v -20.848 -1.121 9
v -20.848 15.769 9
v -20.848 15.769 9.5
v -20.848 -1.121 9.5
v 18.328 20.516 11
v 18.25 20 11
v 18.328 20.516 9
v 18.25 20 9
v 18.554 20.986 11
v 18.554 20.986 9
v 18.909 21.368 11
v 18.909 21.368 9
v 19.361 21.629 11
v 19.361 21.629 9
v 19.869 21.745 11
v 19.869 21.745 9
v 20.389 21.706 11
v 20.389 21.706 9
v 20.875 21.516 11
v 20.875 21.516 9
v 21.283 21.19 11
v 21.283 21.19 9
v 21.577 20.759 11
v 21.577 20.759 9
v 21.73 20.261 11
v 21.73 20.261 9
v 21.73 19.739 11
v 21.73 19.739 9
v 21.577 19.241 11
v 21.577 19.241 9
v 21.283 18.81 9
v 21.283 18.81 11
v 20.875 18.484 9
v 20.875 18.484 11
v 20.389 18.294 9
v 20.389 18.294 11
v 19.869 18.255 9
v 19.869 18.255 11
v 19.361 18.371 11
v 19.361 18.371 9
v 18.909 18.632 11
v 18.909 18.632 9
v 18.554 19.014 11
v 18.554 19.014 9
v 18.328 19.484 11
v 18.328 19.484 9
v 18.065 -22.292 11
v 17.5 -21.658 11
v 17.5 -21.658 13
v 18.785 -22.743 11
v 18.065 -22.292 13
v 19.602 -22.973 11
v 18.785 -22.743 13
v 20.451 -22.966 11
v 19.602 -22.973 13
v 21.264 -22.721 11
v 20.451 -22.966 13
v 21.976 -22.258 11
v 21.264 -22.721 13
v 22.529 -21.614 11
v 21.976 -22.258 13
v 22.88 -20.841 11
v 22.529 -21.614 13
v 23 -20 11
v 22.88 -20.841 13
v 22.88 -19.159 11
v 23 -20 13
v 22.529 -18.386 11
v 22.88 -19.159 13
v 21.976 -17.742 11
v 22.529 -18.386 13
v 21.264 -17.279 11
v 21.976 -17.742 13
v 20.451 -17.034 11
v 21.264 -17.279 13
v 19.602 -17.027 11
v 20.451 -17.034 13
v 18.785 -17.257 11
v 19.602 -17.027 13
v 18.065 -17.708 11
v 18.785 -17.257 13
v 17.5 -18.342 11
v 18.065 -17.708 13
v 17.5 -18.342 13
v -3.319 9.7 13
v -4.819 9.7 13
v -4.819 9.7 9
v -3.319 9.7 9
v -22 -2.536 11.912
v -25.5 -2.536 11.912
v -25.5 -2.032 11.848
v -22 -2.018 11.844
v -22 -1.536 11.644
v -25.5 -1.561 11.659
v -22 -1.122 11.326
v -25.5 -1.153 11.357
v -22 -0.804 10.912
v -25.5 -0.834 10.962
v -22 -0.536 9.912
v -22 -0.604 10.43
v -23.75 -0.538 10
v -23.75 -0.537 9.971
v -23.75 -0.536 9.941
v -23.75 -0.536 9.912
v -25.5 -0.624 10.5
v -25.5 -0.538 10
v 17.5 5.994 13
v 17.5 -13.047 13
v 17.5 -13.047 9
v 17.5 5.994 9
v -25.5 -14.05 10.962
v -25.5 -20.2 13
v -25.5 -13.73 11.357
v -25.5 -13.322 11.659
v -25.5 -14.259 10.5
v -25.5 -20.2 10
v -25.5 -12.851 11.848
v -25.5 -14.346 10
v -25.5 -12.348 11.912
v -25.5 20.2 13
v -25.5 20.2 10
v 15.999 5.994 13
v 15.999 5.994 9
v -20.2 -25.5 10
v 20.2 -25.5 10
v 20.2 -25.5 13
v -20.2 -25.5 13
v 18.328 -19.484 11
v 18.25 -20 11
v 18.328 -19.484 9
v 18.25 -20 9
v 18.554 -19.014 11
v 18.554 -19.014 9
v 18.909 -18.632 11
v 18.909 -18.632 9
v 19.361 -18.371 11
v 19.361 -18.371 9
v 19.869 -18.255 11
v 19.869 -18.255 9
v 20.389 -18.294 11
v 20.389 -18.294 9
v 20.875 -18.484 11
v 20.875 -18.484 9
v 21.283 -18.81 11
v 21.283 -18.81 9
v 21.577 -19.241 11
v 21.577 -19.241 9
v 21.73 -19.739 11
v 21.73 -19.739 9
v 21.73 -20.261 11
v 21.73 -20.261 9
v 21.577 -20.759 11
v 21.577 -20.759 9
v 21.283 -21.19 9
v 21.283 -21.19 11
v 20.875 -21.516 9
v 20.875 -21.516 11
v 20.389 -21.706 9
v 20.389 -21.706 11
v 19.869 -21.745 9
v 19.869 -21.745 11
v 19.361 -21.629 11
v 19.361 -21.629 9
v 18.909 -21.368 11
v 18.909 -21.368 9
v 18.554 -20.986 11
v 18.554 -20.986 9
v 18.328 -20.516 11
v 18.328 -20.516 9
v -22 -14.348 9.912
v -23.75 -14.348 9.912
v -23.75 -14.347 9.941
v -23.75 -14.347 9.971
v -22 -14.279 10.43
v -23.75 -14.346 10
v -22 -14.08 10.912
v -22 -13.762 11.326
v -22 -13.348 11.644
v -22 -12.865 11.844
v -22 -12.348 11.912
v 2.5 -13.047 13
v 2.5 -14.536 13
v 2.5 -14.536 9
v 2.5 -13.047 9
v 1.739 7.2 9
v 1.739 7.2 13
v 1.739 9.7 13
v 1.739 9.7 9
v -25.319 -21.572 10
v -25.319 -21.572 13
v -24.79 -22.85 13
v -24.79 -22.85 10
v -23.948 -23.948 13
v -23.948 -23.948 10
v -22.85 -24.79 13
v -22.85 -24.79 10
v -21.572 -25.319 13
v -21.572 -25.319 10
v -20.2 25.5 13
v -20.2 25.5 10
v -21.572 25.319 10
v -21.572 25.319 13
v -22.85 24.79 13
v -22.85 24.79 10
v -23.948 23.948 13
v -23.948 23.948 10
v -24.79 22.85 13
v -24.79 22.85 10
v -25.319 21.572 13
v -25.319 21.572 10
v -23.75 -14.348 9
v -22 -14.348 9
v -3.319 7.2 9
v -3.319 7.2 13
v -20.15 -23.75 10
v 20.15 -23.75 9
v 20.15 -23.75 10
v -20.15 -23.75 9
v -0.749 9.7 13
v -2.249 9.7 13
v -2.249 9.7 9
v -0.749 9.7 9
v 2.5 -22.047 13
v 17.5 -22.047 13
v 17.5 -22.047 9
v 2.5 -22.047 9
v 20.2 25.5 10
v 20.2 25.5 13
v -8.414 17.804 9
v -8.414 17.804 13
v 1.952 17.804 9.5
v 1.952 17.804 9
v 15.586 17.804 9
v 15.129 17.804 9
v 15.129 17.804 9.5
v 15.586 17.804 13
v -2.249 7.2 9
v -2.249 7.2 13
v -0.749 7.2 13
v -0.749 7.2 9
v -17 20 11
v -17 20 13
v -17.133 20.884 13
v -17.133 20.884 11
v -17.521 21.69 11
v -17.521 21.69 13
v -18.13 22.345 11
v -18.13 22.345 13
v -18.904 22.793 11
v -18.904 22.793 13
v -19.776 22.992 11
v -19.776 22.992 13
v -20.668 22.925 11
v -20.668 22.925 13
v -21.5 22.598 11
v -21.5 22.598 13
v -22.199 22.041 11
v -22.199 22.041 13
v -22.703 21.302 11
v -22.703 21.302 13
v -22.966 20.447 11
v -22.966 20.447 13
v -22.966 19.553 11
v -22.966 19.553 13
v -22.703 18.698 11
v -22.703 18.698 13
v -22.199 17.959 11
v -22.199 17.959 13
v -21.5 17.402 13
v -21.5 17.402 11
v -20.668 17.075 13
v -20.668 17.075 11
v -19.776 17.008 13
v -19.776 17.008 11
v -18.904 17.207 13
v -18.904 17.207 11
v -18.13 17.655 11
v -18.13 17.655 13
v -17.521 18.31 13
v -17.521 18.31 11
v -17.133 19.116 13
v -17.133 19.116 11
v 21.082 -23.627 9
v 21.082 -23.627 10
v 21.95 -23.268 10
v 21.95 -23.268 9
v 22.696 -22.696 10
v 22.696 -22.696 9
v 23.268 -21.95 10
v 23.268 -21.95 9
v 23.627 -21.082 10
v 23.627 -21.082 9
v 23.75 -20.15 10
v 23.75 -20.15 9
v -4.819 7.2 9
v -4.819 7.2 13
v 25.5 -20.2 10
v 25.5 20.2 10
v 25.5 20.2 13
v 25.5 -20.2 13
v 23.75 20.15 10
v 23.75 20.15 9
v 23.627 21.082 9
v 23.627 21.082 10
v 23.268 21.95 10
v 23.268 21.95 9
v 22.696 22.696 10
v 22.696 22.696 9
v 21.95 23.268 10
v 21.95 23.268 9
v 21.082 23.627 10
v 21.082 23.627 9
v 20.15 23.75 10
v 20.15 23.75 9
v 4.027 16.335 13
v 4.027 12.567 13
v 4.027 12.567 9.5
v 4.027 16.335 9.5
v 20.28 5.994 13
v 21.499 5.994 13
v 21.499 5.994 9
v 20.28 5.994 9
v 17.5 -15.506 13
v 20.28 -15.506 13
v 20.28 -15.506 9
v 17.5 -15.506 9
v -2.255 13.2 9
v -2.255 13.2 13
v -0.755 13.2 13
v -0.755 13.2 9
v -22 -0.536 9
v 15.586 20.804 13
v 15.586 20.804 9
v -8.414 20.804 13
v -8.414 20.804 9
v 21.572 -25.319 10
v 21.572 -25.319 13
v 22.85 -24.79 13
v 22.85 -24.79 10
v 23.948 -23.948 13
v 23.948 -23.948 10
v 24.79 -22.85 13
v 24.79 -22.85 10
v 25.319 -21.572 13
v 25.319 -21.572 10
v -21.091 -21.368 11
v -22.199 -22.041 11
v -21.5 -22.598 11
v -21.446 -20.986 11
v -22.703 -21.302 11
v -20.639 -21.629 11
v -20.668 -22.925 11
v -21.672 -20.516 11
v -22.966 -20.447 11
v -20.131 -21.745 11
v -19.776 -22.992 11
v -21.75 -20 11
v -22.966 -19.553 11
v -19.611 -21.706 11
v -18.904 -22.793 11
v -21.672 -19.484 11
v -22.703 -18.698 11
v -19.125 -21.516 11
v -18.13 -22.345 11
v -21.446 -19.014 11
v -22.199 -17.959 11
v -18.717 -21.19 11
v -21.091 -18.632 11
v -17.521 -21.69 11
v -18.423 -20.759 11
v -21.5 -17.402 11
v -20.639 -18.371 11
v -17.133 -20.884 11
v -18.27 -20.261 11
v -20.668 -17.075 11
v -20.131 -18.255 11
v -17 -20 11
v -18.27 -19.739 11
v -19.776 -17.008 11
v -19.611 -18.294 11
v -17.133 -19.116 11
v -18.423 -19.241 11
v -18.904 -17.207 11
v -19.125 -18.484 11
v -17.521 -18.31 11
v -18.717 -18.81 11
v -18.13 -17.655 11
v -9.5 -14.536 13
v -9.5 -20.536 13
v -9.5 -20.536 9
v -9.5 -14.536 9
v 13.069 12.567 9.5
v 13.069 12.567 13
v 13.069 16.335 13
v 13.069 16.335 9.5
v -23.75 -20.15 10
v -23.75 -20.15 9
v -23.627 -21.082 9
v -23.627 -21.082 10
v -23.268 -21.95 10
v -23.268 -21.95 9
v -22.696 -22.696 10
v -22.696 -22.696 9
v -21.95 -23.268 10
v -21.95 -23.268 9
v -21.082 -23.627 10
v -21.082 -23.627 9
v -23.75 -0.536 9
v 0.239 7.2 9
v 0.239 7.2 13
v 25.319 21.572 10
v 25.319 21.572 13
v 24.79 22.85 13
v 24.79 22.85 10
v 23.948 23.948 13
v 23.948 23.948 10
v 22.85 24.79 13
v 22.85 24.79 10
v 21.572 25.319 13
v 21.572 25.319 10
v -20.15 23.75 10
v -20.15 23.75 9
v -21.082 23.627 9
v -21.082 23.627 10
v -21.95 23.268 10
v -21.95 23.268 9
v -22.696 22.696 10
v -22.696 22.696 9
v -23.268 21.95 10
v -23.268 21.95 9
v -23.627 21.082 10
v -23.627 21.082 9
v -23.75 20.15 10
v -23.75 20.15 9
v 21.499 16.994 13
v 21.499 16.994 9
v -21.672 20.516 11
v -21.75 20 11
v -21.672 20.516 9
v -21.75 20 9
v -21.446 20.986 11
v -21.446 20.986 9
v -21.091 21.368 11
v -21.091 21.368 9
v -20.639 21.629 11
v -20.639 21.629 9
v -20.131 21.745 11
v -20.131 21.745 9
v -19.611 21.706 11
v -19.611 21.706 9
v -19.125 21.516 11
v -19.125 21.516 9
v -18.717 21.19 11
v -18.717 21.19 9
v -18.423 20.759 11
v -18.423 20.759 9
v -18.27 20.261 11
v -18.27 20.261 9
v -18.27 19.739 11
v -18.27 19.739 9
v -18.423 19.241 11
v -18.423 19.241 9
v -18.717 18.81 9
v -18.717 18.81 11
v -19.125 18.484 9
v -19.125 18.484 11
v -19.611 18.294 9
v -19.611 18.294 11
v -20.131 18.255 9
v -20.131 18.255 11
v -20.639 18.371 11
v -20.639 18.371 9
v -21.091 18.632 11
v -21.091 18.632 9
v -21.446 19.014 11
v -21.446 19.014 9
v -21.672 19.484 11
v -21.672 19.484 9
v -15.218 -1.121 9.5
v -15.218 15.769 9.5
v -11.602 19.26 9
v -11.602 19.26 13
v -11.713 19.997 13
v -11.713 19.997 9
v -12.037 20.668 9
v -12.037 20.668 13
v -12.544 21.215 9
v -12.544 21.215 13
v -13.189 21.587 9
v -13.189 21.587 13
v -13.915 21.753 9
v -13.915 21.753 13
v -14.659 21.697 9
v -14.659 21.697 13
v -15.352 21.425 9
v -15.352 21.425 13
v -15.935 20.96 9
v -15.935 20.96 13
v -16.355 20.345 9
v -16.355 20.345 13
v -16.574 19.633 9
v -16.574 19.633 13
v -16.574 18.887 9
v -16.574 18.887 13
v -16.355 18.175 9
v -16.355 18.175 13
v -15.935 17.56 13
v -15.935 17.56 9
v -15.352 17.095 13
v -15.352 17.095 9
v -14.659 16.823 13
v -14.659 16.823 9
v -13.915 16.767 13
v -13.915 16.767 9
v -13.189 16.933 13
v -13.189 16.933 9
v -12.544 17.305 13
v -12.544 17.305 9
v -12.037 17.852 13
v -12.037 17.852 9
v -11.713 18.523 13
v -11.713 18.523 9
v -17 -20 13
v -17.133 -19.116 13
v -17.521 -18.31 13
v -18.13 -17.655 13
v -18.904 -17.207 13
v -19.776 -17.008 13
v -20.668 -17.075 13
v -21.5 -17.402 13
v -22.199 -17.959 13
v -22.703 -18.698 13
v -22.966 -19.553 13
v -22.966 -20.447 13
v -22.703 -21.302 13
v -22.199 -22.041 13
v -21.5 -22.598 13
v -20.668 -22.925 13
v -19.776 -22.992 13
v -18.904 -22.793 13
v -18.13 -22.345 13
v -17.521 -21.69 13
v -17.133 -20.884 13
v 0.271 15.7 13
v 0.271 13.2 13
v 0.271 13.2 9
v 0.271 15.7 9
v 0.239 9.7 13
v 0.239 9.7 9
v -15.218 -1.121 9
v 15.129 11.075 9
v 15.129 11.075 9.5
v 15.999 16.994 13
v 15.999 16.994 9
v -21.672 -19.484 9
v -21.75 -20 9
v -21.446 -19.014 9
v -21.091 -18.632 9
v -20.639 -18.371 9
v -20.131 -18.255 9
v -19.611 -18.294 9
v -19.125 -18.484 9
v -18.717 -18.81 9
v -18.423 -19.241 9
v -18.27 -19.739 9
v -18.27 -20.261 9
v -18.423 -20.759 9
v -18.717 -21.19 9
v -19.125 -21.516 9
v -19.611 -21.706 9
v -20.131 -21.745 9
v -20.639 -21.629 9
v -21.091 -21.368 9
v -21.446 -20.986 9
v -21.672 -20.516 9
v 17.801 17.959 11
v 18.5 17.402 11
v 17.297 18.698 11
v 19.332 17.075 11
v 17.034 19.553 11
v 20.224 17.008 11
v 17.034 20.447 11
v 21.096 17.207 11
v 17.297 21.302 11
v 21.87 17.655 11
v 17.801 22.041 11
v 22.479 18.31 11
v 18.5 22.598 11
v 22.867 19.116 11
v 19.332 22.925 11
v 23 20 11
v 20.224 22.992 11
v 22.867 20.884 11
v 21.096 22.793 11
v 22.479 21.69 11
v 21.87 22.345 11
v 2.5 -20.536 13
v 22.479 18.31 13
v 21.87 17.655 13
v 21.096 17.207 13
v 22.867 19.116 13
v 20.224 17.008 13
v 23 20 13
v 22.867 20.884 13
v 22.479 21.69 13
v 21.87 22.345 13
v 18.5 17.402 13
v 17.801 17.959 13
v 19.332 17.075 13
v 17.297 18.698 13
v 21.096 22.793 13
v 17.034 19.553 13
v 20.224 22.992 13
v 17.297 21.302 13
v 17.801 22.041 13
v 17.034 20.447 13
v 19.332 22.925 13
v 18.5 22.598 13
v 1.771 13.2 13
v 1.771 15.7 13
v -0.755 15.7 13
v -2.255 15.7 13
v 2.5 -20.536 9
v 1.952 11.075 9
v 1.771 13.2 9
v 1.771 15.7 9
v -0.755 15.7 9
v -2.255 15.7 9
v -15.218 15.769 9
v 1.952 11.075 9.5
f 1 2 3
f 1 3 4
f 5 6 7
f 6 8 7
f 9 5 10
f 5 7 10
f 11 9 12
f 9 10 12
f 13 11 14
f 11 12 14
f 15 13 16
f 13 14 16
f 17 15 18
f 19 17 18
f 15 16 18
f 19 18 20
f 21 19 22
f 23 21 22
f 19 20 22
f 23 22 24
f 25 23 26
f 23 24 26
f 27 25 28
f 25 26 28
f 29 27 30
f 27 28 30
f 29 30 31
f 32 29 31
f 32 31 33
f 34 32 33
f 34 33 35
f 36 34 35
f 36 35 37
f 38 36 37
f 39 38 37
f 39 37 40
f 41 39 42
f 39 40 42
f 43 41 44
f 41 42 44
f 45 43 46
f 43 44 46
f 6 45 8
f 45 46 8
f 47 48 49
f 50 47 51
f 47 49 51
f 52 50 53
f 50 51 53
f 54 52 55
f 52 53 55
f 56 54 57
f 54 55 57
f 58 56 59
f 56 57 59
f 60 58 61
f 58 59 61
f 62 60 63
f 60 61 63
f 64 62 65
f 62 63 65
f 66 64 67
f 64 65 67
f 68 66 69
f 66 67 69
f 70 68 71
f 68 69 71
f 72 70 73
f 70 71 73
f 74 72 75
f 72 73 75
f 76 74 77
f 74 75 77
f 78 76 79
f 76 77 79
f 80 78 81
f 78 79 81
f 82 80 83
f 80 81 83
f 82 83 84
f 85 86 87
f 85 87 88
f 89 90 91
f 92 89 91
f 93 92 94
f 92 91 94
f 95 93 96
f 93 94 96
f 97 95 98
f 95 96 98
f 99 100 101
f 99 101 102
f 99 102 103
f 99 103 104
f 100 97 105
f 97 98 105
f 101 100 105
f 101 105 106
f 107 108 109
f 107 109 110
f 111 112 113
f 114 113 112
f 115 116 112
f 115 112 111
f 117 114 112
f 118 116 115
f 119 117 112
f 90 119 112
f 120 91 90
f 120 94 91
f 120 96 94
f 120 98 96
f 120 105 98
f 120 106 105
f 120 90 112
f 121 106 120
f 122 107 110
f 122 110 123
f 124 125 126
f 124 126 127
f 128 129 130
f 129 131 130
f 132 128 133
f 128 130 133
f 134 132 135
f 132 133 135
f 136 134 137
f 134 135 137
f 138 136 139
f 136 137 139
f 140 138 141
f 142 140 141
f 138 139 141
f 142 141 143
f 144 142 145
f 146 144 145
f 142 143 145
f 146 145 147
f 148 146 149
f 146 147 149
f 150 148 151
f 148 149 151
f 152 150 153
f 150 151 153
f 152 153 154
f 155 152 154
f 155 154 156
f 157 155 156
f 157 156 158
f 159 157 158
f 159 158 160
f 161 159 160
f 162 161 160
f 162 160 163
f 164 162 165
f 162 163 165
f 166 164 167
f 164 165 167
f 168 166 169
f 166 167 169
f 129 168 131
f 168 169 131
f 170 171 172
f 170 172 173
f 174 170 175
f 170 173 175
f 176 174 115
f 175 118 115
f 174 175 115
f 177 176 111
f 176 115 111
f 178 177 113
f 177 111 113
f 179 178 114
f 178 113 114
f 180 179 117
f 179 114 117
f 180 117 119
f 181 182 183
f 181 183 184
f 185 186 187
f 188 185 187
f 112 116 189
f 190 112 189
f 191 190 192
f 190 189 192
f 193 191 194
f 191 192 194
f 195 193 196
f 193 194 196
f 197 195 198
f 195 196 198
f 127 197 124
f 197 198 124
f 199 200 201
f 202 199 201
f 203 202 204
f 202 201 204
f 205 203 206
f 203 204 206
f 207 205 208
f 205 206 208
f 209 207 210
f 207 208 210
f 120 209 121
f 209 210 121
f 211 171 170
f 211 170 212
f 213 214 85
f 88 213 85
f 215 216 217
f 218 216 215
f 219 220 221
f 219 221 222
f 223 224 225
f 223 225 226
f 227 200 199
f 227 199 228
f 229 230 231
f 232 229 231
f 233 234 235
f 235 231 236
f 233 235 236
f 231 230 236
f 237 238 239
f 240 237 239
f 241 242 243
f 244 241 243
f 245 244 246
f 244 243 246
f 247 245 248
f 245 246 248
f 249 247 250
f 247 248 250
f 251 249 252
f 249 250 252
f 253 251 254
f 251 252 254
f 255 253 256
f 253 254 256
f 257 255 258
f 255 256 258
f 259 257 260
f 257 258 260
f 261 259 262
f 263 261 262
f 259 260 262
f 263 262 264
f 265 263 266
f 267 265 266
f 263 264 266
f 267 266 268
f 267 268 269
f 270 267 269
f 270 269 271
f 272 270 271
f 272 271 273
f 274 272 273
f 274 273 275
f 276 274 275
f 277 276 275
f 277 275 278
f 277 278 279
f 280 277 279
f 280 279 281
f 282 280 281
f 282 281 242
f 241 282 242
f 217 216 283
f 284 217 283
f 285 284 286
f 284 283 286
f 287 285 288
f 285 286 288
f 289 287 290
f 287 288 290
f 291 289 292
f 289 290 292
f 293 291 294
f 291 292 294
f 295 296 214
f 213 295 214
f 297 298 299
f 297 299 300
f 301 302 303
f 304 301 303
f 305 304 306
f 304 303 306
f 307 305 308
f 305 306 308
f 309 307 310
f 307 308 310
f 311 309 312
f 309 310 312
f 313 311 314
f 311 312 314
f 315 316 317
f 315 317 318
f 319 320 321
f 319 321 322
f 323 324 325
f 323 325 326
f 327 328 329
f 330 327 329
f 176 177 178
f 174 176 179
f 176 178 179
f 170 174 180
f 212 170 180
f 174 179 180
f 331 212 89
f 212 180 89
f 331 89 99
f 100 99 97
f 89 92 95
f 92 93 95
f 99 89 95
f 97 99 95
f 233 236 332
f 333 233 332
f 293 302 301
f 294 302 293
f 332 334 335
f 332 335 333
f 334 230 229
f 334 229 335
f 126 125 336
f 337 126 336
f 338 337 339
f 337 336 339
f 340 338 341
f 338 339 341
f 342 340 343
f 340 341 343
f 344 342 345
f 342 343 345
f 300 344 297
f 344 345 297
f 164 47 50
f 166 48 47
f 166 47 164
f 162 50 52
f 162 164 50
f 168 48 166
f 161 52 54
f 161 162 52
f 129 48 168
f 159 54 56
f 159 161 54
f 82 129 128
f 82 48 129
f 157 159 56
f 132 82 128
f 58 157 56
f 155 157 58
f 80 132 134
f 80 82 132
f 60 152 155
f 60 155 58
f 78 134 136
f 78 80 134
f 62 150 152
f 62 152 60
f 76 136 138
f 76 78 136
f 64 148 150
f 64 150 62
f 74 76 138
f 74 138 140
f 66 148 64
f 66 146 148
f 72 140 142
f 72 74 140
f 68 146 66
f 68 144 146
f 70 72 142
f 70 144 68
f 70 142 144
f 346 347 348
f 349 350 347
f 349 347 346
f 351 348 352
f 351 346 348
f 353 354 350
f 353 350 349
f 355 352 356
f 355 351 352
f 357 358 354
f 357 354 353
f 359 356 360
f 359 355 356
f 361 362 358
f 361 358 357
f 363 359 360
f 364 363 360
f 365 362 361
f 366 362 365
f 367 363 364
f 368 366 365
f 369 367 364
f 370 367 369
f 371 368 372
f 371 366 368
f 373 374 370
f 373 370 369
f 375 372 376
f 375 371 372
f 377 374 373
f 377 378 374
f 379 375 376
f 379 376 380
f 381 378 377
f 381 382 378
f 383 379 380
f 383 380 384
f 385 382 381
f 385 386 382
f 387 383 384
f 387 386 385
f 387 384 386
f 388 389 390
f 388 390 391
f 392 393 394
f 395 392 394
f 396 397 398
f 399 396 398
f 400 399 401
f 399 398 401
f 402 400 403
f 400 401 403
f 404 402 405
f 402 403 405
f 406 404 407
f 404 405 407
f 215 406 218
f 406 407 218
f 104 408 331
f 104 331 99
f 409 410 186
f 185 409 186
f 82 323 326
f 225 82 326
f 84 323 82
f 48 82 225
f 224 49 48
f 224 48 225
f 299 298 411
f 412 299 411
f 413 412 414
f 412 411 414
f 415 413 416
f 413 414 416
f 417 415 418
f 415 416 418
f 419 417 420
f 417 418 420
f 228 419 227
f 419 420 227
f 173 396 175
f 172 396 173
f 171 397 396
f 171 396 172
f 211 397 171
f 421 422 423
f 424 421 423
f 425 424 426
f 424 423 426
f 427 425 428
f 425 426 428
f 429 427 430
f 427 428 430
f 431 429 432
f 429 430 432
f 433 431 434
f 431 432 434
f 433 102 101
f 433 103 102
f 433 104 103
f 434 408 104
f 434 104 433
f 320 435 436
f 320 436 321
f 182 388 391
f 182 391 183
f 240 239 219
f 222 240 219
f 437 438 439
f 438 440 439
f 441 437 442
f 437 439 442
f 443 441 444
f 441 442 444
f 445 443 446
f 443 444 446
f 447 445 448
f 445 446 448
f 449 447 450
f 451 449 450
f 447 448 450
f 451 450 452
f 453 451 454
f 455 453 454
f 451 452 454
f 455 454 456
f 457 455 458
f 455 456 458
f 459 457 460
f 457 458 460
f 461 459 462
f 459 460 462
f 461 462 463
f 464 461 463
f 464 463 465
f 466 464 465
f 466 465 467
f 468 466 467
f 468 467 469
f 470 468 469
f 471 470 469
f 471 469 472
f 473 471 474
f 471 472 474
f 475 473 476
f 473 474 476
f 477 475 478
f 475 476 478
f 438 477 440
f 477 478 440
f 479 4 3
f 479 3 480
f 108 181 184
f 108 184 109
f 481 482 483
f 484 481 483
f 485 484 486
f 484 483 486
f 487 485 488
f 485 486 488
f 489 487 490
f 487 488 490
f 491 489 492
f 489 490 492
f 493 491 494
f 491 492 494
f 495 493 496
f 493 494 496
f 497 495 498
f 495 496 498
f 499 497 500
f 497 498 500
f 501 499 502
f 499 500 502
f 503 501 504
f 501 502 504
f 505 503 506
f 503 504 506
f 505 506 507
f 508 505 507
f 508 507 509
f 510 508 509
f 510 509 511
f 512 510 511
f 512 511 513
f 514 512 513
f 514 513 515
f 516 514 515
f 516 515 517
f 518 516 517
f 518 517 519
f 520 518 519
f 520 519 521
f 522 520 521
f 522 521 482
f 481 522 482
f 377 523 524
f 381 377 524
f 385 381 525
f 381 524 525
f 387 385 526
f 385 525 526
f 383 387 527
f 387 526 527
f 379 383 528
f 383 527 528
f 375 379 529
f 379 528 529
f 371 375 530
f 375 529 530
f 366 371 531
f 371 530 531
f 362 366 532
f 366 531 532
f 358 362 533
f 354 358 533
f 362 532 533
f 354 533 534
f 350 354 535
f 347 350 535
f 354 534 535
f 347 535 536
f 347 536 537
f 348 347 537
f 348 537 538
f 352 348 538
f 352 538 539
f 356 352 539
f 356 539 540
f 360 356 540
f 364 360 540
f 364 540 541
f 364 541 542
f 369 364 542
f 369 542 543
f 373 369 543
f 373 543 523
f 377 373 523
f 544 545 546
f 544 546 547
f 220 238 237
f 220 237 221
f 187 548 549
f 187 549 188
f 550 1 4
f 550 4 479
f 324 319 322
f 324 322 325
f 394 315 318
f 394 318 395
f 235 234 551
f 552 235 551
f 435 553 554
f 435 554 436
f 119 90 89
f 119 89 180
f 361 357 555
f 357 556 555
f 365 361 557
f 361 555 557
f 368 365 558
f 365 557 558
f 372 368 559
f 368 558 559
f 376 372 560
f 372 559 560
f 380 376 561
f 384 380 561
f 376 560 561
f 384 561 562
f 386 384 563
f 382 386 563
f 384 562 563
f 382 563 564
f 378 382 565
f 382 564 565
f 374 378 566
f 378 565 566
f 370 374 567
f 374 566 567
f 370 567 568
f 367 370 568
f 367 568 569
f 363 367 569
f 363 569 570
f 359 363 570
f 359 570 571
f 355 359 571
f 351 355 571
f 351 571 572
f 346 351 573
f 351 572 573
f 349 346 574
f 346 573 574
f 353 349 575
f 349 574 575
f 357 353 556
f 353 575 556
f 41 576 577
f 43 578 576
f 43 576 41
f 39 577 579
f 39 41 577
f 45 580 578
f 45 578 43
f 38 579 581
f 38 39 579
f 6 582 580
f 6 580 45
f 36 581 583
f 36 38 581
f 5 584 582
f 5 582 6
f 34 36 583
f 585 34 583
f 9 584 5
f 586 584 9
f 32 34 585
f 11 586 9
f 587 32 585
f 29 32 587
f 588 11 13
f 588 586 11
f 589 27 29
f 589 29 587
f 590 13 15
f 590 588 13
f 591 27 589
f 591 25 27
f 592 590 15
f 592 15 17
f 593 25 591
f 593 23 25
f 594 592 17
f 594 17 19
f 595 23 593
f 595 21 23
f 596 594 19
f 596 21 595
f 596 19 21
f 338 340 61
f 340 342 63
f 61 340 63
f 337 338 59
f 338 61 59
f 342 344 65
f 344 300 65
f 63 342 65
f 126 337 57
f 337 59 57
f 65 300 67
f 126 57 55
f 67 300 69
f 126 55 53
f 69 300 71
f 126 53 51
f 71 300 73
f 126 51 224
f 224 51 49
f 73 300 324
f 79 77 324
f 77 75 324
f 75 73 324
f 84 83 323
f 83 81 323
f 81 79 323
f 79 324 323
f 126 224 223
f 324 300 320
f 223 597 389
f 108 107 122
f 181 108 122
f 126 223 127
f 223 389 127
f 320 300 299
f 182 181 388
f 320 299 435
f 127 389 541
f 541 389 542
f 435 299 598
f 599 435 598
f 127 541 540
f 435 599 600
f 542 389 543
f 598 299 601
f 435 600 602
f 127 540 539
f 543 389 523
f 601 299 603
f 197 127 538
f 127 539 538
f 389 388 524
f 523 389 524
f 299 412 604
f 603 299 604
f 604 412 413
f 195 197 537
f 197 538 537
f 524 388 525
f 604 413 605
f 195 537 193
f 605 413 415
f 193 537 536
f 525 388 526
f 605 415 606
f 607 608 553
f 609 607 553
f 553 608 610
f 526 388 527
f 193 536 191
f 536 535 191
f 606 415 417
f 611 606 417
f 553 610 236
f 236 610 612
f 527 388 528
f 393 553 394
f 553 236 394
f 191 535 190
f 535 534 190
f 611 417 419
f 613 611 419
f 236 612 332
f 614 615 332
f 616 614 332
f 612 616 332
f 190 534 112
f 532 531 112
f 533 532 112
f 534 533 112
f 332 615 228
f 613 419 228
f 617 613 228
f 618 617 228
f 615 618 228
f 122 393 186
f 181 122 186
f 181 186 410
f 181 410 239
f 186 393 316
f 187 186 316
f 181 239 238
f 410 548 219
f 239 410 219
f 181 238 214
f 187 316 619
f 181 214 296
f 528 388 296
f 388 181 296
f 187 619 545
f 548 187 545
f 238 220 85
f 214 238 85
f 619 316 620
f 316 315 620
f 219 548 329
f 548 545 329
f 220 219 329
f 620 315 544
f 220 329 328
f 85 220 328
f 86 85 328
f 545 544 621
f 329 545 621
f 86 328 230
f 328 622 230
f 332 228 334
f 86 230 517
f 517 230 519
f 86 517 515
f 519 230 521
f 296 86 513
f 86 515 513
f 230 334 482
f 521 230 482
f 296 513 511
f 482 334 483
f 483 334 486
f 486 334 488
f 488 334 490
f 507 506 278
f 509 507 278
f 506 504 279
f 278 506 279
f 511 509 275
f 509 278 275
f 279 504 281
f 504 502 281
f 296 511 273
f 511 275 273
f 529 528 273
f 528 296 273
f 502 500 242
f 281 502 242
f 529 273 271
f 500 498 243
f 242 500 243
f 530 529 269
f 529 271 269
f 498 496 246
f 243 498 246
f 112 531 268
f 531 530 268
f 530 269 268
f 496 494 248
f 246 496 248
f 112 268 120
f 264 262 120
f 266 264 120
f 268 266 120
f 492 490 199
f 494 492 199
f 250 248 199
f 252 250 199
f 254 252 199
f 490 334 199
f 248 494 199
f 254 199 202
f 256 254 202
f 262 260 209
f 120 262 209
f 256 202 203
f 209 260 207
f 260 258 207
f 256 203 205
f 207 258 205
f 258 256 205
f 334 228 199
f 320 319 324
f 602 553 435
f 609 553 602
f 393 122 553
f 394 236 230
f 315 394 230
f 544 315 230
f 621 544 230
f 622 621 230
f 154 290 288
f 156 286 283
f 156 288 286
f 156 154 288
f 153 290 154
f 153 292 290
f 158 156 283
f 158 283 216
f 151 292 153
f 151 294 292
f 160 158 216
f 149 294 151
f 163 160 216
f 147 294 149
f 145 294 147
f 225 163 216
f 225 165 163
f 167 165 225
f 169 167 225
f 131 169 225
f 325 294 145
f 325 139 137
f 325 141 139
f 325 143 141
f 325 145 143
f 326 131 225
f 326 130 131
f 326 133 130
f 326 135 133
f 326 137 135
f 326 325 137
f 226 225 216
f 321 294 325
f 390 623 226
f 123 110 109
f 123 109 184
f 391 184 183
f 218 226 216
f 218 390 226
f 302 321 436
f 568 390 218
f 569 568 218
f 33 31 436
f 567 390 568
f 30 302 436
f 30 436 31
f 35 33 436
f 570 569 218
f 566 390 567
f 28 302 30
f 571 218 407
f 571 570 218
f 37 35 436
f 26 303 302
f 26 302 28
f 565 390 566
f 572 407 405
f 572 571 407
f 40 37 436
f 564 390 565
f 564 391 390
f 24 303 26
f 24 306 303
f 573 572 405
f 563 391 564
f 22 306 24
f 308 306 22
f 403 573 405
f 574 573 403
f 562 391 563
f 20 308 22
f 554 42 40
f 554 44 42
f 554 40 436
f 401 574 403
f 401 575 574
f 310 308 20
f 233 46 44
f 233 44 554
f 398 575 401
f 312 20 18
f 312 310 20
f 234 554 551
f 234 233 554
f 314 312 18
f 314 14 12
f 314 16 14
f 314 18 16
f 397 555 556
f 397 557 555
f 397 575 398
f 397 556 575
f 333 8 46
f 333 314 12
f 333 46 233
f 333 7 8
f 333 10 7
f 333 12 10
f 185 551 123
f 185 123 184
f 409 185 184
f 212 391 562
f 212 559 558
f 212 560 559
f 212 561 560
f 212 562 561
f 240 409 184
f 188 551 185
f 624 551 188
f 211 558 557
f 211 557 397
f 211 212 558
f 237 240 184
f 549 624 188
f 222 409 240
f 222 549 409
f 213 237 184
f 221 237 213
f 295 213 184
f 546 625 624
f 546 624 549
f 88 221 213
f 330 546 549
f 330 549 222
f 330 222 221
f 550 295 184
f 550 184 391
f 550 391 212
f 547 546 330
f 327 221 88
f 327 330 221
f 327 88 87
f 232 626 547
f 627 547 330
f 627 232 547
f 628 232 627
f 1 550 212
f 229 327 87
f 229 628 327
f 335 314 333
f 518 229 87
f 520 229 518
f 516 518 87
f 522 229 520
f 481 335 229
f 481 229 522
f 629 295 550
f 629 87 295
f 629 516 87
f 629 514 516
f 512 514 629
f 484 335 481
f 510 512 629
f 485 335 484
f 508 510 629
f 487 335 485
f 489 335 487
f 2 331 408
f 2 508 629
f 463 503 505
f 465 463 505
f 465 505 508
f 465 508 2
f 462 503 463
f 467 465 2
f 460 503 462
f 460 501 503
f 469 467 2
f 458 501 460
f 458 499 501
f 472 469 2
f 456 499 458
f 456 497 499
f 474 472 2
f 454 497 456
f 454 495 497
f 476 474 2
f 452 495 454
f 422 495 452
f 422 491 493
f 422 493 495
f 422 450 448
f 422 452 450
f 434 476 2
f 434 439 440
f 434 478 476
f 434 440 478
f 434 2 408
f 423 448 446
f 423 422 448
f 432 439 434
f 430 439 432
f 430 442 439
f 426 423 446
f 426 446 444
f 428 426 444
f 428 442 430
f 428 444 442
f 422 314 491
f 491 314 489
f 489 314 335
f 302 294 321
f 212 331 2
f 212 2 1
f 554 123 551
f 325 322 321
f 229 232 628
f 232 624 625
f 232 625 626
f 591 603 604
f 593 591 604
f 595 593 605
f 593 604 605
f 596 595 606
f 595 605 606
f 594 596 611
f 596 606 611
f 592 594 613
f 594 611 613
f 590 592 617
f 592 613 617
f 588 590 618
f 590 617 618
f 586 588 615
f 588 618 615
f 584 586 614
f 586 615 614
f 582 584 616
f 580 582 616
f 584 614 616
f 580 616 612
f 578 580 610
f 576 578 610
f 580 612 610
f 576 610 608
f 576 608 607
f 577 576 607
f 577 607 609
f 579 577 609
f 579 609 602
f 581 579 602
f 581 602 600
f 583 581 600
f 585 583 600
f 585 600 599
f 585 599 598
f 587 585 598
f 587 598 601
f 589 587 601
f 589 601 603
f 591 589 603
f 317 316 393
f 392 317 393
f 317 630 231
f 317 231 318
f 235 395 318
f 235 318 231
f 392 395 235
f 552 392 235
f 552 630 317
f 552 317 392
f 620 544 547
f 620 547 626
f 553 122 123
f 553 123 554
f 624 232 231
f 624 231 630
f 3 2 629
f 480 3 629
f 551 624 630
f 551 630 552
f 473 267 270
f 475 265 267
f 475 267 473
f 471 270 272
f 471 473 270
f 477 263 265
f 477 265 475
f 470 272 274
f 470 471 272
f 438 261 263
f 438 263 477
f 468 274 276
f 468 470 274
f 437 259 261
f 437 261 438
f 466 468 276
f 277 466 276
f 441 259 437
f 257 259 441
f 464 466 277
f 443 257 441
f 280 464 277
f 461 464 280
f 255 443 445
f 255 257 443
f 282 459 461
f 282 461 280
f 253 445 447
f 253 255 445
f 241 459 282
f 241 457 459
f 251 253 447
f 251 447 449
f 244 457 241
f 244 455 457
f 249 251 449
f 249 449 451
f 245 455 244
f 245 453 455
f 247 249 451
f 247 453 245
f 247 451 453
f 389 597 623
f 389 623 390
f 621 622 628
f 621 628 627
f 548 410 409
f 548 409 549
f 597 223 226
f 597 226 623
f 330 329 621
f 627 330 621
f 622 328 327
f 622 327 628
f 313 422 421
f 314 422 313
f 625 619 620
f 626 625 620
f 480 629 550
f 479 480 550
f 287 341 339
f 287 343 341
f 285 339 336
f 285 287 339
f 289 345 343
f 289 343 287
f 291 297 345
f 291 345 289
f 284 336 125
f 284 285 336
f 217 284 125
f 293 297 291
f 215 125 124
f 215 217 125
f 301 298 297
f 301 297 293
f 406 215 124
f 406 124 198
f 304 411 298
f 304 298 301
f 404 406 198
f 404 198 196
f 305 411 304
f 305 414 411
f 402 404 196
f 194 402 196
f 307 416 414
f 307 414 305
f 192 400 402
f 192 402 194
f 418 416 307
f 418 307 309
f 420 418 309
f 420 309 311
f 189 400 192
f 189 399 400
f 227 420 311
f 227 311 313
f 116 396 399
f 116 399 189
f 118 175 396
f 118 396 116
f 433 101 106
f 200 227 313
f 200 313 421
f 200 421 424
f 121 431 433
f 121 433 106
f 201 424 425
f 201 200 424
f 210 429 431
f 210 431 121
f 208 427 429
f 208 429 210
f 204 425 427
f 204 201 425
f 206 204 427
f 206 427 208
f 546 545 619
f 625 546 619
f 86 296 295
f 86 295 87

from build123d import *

# Parameters (mm, degrees)
PAD005_DEPTH     = 4
PAD002_DEPTH     = 1
PAD003_DEPTH     = 3
HOLE_D           = 3.5
HOLE_CBORE_D     = 6
HOLE_CBORE_DEPTH = 2
SKETCH011_R      = 2.5
SKETCH011_W      = 9.042401
SKETCH011_H      = 3.767665
SKETCH011_W_2    = 24
SKETCH011_H_2    = 3
SKETCH011_W_3    = 1.5
SKETCH011_H_3    = 2.5
POCKET005_DEPTH  = 5
SKETCH012_W      = 5.629994
SKETCH012_H      = 16.889996
SKETCH012_W_2    = 13.176597
SKETCH012_H_2    = 7.067448
POCKET006_DEPTH  = 0.5


with BuildPart() as usb_c_cutter:
    # Sketch008 → Pad005 (new body)
    with BuildSketch(Plane(origin=(0, 0, 0), x_dir=(0, -1, 0), z_dir=(-1, 0, 0))):
        with BuildLine():
            Line((2.535801, 11.911979), (12.347588, 11.911979))
            ThreePointArc((14.347588, 9.911979), (13.761802, 11.326192), (12.347588, 11.911979))
            Line((14.347588, 9.911979), (14.347588, 3.866895))
            ThreePointArc((12.347588, 1.866895), (13.761802, 2.452682), (14.347588, 3.866895))
            Line((12.347588, 1.866895), (2.535801, 1.866895))
            ThreePointArc((0.535801, 3.866895), (1.121588, 2.452682), (2.535801, 1.866895))
            Line((0.535801, 3.866895), (0.535801, 9.911979))
            ThreePointArc((2.535801, 11.911979), (1.121588, 11.326192), (0.535801, 9.911979))
        make_face()
    extrude(amount=-PAD005_DEPTH)


with BuildPart() as usb_c_cutter_1:
    # Body002 placement: moved
    add(usb_c_cutter.part.moved(Location((-26, 0, 0))))


with BuildPart() as lid_pocketed:
    # Sketch005 → Pad002 (new body)
    with BuildSketch(Plane.XY.offset(7)):
        with BuildLine():
            Line((-20.15, 23.75), (20.15, 23.75))
            ThreePointArc((23.75, 20.15), (22.695584, 22.695584), (20.15, 23.75))
            Line((23.75, 20.15), (23.75, -20.15))
            ThreePointArc((20.15, -23.75), (22.695584, -22.695584), (23.75, -20.15))
            Line((20.15, -23.75), (-20.15, -23.75))
            ThreePointArc((-23.75, -20.15), (-22.695584, -22.695584), (-20.15, -23.75))
            Line((-23.75, -20.15), (-23.75, 20.15))
            ThreePointArc((-20.15, 23.75), (-22.695584, 22.695584), (-23.75, 20.15))
        make_face()
    extrude(amount=PAD002_DEPTH)

    # Sketch006 (on Face10 of Pad002) → Pad003 (join)
    with BuildSketch(Plane.XY.offset(8)):
        with BuildLine():
            Line((-20.2, 25.5), (20.2, 25.5))
            ThreePointArc((25.5, 20.2), (23.947666, 23.947666), (20.2, 25.5))
            Line((25.5, 20.2), (25.5, -20.2))
            ThreePointArc((20.2, -25.5), (23.947666, -23.947666), (25.5, -20.2))
            Line((20.2, -25.5), (-20.2, -25.5))
            ThreePointArc((-25.5, -20.2), (-23.947666, -23.947666), (-20.2, -25.5))
            Line((-25.5, -20.2), (-25.5, 20.2))
            ThreePointArc((-20.2, 25.5), (-23.947666, 23.947666), (-25.5, 20.2))
        make_face()
    extrude(amount=PAD003_DEPTH)

    # Hole (through all)
    with Locations(Plane.XY.offset(11)):
        with Locations((-20, 20), (20, 20), (20, -20), (-20, -20)):
            CounterBoreHole(HOLE_D / 2, HOLE_CBORE_D / 2, HOLE_CBORE_DEPTH)


with BuildPart() as lid_pocketed_1:
    # Body001 placement: moved
    add(lid_pocketed.part.moved(Location((0, 0, 2))))

    # Cut: cut USB-C Cutter
    add(usb_c_cutter_1.part, mode=Mode.SUBTRACT)

    # Sketch011 (on Face7 of BaseFeature001) → Pocket005 (cut)
    with BuildSketch(Plane.XY.offset(13)):
        with Locations((-14.102295, 19.26004)):
            Circle(SKETCH011_R)
        with Locations((8.547714, 14.450916)):
            Rectangle(SKETCH011_W, SKETCH011_H)
        Polygon((15.998645, 16.994311), (21.498645, 16.994311), (21.498645, 5.994311), (20.28048, 5.994311), (20.28048, -15.505689), (17.5, -15.505689), (17.5, -22.047392), (2.5, -22.047392), (2.5, -20.535681), (-9.5, -20.535681), (-9.5, -14.535681), (2.5, -14.535681), (2.5, -13.047392), (17.5, -13.047392), (17.5, 5.994311), (15.998645, 5.994311), align=None)
        with Locations((3.585587, 19.303802)):
            Rectangle(SKETCH011_W_2, SKETCH011_H_2)
        with Locations((-1.504905, 14.45)):
            Rectangle(SKETCH011_W_3, SKETCH011_H_3)
        with Locations((1.020606, 14.45)):
            Rectangle(SKETCH011_W_3, SKETCH011_H_3)
        with Locations((0.989071, 8.45)):
            Rectangle(SKETCH011_W_3, SKETCH011_H_3)
        with Locations((-1.499158, 8.45)):
            Rectangle(SKETCH011_W_3, SKETCH011_H_3)
        with Locations((-4.069136, 8.45)):
            Rectangle(SKETCH011_W_3, SKETCH011_H_3)
    extrude(amount=-POCKET005_DEPTH, mode=Mode.SUBTRACT)

    # Sketch012 (on Face76 of Pocket005) → Pocket006 (cut)
    with BuildSketch(Plane(origin=(0, 0, 9), x_dir=(1, 0, 0), z_dir=(0, 0, -1))):
        with Locations((-18.033425, -7.323527)):
            Rectangle(SKETCH012_W, SKETCH012_H)
        with Locations((8.540513, -14.609106)):
            Rectangle(SKETCH012_W_2, SKETCH012_H_2)
    extrude(amount=-POCKET006_DEPTH, mode=Mode.SUBTRACT)


solid = lid_pocketed_1.part
